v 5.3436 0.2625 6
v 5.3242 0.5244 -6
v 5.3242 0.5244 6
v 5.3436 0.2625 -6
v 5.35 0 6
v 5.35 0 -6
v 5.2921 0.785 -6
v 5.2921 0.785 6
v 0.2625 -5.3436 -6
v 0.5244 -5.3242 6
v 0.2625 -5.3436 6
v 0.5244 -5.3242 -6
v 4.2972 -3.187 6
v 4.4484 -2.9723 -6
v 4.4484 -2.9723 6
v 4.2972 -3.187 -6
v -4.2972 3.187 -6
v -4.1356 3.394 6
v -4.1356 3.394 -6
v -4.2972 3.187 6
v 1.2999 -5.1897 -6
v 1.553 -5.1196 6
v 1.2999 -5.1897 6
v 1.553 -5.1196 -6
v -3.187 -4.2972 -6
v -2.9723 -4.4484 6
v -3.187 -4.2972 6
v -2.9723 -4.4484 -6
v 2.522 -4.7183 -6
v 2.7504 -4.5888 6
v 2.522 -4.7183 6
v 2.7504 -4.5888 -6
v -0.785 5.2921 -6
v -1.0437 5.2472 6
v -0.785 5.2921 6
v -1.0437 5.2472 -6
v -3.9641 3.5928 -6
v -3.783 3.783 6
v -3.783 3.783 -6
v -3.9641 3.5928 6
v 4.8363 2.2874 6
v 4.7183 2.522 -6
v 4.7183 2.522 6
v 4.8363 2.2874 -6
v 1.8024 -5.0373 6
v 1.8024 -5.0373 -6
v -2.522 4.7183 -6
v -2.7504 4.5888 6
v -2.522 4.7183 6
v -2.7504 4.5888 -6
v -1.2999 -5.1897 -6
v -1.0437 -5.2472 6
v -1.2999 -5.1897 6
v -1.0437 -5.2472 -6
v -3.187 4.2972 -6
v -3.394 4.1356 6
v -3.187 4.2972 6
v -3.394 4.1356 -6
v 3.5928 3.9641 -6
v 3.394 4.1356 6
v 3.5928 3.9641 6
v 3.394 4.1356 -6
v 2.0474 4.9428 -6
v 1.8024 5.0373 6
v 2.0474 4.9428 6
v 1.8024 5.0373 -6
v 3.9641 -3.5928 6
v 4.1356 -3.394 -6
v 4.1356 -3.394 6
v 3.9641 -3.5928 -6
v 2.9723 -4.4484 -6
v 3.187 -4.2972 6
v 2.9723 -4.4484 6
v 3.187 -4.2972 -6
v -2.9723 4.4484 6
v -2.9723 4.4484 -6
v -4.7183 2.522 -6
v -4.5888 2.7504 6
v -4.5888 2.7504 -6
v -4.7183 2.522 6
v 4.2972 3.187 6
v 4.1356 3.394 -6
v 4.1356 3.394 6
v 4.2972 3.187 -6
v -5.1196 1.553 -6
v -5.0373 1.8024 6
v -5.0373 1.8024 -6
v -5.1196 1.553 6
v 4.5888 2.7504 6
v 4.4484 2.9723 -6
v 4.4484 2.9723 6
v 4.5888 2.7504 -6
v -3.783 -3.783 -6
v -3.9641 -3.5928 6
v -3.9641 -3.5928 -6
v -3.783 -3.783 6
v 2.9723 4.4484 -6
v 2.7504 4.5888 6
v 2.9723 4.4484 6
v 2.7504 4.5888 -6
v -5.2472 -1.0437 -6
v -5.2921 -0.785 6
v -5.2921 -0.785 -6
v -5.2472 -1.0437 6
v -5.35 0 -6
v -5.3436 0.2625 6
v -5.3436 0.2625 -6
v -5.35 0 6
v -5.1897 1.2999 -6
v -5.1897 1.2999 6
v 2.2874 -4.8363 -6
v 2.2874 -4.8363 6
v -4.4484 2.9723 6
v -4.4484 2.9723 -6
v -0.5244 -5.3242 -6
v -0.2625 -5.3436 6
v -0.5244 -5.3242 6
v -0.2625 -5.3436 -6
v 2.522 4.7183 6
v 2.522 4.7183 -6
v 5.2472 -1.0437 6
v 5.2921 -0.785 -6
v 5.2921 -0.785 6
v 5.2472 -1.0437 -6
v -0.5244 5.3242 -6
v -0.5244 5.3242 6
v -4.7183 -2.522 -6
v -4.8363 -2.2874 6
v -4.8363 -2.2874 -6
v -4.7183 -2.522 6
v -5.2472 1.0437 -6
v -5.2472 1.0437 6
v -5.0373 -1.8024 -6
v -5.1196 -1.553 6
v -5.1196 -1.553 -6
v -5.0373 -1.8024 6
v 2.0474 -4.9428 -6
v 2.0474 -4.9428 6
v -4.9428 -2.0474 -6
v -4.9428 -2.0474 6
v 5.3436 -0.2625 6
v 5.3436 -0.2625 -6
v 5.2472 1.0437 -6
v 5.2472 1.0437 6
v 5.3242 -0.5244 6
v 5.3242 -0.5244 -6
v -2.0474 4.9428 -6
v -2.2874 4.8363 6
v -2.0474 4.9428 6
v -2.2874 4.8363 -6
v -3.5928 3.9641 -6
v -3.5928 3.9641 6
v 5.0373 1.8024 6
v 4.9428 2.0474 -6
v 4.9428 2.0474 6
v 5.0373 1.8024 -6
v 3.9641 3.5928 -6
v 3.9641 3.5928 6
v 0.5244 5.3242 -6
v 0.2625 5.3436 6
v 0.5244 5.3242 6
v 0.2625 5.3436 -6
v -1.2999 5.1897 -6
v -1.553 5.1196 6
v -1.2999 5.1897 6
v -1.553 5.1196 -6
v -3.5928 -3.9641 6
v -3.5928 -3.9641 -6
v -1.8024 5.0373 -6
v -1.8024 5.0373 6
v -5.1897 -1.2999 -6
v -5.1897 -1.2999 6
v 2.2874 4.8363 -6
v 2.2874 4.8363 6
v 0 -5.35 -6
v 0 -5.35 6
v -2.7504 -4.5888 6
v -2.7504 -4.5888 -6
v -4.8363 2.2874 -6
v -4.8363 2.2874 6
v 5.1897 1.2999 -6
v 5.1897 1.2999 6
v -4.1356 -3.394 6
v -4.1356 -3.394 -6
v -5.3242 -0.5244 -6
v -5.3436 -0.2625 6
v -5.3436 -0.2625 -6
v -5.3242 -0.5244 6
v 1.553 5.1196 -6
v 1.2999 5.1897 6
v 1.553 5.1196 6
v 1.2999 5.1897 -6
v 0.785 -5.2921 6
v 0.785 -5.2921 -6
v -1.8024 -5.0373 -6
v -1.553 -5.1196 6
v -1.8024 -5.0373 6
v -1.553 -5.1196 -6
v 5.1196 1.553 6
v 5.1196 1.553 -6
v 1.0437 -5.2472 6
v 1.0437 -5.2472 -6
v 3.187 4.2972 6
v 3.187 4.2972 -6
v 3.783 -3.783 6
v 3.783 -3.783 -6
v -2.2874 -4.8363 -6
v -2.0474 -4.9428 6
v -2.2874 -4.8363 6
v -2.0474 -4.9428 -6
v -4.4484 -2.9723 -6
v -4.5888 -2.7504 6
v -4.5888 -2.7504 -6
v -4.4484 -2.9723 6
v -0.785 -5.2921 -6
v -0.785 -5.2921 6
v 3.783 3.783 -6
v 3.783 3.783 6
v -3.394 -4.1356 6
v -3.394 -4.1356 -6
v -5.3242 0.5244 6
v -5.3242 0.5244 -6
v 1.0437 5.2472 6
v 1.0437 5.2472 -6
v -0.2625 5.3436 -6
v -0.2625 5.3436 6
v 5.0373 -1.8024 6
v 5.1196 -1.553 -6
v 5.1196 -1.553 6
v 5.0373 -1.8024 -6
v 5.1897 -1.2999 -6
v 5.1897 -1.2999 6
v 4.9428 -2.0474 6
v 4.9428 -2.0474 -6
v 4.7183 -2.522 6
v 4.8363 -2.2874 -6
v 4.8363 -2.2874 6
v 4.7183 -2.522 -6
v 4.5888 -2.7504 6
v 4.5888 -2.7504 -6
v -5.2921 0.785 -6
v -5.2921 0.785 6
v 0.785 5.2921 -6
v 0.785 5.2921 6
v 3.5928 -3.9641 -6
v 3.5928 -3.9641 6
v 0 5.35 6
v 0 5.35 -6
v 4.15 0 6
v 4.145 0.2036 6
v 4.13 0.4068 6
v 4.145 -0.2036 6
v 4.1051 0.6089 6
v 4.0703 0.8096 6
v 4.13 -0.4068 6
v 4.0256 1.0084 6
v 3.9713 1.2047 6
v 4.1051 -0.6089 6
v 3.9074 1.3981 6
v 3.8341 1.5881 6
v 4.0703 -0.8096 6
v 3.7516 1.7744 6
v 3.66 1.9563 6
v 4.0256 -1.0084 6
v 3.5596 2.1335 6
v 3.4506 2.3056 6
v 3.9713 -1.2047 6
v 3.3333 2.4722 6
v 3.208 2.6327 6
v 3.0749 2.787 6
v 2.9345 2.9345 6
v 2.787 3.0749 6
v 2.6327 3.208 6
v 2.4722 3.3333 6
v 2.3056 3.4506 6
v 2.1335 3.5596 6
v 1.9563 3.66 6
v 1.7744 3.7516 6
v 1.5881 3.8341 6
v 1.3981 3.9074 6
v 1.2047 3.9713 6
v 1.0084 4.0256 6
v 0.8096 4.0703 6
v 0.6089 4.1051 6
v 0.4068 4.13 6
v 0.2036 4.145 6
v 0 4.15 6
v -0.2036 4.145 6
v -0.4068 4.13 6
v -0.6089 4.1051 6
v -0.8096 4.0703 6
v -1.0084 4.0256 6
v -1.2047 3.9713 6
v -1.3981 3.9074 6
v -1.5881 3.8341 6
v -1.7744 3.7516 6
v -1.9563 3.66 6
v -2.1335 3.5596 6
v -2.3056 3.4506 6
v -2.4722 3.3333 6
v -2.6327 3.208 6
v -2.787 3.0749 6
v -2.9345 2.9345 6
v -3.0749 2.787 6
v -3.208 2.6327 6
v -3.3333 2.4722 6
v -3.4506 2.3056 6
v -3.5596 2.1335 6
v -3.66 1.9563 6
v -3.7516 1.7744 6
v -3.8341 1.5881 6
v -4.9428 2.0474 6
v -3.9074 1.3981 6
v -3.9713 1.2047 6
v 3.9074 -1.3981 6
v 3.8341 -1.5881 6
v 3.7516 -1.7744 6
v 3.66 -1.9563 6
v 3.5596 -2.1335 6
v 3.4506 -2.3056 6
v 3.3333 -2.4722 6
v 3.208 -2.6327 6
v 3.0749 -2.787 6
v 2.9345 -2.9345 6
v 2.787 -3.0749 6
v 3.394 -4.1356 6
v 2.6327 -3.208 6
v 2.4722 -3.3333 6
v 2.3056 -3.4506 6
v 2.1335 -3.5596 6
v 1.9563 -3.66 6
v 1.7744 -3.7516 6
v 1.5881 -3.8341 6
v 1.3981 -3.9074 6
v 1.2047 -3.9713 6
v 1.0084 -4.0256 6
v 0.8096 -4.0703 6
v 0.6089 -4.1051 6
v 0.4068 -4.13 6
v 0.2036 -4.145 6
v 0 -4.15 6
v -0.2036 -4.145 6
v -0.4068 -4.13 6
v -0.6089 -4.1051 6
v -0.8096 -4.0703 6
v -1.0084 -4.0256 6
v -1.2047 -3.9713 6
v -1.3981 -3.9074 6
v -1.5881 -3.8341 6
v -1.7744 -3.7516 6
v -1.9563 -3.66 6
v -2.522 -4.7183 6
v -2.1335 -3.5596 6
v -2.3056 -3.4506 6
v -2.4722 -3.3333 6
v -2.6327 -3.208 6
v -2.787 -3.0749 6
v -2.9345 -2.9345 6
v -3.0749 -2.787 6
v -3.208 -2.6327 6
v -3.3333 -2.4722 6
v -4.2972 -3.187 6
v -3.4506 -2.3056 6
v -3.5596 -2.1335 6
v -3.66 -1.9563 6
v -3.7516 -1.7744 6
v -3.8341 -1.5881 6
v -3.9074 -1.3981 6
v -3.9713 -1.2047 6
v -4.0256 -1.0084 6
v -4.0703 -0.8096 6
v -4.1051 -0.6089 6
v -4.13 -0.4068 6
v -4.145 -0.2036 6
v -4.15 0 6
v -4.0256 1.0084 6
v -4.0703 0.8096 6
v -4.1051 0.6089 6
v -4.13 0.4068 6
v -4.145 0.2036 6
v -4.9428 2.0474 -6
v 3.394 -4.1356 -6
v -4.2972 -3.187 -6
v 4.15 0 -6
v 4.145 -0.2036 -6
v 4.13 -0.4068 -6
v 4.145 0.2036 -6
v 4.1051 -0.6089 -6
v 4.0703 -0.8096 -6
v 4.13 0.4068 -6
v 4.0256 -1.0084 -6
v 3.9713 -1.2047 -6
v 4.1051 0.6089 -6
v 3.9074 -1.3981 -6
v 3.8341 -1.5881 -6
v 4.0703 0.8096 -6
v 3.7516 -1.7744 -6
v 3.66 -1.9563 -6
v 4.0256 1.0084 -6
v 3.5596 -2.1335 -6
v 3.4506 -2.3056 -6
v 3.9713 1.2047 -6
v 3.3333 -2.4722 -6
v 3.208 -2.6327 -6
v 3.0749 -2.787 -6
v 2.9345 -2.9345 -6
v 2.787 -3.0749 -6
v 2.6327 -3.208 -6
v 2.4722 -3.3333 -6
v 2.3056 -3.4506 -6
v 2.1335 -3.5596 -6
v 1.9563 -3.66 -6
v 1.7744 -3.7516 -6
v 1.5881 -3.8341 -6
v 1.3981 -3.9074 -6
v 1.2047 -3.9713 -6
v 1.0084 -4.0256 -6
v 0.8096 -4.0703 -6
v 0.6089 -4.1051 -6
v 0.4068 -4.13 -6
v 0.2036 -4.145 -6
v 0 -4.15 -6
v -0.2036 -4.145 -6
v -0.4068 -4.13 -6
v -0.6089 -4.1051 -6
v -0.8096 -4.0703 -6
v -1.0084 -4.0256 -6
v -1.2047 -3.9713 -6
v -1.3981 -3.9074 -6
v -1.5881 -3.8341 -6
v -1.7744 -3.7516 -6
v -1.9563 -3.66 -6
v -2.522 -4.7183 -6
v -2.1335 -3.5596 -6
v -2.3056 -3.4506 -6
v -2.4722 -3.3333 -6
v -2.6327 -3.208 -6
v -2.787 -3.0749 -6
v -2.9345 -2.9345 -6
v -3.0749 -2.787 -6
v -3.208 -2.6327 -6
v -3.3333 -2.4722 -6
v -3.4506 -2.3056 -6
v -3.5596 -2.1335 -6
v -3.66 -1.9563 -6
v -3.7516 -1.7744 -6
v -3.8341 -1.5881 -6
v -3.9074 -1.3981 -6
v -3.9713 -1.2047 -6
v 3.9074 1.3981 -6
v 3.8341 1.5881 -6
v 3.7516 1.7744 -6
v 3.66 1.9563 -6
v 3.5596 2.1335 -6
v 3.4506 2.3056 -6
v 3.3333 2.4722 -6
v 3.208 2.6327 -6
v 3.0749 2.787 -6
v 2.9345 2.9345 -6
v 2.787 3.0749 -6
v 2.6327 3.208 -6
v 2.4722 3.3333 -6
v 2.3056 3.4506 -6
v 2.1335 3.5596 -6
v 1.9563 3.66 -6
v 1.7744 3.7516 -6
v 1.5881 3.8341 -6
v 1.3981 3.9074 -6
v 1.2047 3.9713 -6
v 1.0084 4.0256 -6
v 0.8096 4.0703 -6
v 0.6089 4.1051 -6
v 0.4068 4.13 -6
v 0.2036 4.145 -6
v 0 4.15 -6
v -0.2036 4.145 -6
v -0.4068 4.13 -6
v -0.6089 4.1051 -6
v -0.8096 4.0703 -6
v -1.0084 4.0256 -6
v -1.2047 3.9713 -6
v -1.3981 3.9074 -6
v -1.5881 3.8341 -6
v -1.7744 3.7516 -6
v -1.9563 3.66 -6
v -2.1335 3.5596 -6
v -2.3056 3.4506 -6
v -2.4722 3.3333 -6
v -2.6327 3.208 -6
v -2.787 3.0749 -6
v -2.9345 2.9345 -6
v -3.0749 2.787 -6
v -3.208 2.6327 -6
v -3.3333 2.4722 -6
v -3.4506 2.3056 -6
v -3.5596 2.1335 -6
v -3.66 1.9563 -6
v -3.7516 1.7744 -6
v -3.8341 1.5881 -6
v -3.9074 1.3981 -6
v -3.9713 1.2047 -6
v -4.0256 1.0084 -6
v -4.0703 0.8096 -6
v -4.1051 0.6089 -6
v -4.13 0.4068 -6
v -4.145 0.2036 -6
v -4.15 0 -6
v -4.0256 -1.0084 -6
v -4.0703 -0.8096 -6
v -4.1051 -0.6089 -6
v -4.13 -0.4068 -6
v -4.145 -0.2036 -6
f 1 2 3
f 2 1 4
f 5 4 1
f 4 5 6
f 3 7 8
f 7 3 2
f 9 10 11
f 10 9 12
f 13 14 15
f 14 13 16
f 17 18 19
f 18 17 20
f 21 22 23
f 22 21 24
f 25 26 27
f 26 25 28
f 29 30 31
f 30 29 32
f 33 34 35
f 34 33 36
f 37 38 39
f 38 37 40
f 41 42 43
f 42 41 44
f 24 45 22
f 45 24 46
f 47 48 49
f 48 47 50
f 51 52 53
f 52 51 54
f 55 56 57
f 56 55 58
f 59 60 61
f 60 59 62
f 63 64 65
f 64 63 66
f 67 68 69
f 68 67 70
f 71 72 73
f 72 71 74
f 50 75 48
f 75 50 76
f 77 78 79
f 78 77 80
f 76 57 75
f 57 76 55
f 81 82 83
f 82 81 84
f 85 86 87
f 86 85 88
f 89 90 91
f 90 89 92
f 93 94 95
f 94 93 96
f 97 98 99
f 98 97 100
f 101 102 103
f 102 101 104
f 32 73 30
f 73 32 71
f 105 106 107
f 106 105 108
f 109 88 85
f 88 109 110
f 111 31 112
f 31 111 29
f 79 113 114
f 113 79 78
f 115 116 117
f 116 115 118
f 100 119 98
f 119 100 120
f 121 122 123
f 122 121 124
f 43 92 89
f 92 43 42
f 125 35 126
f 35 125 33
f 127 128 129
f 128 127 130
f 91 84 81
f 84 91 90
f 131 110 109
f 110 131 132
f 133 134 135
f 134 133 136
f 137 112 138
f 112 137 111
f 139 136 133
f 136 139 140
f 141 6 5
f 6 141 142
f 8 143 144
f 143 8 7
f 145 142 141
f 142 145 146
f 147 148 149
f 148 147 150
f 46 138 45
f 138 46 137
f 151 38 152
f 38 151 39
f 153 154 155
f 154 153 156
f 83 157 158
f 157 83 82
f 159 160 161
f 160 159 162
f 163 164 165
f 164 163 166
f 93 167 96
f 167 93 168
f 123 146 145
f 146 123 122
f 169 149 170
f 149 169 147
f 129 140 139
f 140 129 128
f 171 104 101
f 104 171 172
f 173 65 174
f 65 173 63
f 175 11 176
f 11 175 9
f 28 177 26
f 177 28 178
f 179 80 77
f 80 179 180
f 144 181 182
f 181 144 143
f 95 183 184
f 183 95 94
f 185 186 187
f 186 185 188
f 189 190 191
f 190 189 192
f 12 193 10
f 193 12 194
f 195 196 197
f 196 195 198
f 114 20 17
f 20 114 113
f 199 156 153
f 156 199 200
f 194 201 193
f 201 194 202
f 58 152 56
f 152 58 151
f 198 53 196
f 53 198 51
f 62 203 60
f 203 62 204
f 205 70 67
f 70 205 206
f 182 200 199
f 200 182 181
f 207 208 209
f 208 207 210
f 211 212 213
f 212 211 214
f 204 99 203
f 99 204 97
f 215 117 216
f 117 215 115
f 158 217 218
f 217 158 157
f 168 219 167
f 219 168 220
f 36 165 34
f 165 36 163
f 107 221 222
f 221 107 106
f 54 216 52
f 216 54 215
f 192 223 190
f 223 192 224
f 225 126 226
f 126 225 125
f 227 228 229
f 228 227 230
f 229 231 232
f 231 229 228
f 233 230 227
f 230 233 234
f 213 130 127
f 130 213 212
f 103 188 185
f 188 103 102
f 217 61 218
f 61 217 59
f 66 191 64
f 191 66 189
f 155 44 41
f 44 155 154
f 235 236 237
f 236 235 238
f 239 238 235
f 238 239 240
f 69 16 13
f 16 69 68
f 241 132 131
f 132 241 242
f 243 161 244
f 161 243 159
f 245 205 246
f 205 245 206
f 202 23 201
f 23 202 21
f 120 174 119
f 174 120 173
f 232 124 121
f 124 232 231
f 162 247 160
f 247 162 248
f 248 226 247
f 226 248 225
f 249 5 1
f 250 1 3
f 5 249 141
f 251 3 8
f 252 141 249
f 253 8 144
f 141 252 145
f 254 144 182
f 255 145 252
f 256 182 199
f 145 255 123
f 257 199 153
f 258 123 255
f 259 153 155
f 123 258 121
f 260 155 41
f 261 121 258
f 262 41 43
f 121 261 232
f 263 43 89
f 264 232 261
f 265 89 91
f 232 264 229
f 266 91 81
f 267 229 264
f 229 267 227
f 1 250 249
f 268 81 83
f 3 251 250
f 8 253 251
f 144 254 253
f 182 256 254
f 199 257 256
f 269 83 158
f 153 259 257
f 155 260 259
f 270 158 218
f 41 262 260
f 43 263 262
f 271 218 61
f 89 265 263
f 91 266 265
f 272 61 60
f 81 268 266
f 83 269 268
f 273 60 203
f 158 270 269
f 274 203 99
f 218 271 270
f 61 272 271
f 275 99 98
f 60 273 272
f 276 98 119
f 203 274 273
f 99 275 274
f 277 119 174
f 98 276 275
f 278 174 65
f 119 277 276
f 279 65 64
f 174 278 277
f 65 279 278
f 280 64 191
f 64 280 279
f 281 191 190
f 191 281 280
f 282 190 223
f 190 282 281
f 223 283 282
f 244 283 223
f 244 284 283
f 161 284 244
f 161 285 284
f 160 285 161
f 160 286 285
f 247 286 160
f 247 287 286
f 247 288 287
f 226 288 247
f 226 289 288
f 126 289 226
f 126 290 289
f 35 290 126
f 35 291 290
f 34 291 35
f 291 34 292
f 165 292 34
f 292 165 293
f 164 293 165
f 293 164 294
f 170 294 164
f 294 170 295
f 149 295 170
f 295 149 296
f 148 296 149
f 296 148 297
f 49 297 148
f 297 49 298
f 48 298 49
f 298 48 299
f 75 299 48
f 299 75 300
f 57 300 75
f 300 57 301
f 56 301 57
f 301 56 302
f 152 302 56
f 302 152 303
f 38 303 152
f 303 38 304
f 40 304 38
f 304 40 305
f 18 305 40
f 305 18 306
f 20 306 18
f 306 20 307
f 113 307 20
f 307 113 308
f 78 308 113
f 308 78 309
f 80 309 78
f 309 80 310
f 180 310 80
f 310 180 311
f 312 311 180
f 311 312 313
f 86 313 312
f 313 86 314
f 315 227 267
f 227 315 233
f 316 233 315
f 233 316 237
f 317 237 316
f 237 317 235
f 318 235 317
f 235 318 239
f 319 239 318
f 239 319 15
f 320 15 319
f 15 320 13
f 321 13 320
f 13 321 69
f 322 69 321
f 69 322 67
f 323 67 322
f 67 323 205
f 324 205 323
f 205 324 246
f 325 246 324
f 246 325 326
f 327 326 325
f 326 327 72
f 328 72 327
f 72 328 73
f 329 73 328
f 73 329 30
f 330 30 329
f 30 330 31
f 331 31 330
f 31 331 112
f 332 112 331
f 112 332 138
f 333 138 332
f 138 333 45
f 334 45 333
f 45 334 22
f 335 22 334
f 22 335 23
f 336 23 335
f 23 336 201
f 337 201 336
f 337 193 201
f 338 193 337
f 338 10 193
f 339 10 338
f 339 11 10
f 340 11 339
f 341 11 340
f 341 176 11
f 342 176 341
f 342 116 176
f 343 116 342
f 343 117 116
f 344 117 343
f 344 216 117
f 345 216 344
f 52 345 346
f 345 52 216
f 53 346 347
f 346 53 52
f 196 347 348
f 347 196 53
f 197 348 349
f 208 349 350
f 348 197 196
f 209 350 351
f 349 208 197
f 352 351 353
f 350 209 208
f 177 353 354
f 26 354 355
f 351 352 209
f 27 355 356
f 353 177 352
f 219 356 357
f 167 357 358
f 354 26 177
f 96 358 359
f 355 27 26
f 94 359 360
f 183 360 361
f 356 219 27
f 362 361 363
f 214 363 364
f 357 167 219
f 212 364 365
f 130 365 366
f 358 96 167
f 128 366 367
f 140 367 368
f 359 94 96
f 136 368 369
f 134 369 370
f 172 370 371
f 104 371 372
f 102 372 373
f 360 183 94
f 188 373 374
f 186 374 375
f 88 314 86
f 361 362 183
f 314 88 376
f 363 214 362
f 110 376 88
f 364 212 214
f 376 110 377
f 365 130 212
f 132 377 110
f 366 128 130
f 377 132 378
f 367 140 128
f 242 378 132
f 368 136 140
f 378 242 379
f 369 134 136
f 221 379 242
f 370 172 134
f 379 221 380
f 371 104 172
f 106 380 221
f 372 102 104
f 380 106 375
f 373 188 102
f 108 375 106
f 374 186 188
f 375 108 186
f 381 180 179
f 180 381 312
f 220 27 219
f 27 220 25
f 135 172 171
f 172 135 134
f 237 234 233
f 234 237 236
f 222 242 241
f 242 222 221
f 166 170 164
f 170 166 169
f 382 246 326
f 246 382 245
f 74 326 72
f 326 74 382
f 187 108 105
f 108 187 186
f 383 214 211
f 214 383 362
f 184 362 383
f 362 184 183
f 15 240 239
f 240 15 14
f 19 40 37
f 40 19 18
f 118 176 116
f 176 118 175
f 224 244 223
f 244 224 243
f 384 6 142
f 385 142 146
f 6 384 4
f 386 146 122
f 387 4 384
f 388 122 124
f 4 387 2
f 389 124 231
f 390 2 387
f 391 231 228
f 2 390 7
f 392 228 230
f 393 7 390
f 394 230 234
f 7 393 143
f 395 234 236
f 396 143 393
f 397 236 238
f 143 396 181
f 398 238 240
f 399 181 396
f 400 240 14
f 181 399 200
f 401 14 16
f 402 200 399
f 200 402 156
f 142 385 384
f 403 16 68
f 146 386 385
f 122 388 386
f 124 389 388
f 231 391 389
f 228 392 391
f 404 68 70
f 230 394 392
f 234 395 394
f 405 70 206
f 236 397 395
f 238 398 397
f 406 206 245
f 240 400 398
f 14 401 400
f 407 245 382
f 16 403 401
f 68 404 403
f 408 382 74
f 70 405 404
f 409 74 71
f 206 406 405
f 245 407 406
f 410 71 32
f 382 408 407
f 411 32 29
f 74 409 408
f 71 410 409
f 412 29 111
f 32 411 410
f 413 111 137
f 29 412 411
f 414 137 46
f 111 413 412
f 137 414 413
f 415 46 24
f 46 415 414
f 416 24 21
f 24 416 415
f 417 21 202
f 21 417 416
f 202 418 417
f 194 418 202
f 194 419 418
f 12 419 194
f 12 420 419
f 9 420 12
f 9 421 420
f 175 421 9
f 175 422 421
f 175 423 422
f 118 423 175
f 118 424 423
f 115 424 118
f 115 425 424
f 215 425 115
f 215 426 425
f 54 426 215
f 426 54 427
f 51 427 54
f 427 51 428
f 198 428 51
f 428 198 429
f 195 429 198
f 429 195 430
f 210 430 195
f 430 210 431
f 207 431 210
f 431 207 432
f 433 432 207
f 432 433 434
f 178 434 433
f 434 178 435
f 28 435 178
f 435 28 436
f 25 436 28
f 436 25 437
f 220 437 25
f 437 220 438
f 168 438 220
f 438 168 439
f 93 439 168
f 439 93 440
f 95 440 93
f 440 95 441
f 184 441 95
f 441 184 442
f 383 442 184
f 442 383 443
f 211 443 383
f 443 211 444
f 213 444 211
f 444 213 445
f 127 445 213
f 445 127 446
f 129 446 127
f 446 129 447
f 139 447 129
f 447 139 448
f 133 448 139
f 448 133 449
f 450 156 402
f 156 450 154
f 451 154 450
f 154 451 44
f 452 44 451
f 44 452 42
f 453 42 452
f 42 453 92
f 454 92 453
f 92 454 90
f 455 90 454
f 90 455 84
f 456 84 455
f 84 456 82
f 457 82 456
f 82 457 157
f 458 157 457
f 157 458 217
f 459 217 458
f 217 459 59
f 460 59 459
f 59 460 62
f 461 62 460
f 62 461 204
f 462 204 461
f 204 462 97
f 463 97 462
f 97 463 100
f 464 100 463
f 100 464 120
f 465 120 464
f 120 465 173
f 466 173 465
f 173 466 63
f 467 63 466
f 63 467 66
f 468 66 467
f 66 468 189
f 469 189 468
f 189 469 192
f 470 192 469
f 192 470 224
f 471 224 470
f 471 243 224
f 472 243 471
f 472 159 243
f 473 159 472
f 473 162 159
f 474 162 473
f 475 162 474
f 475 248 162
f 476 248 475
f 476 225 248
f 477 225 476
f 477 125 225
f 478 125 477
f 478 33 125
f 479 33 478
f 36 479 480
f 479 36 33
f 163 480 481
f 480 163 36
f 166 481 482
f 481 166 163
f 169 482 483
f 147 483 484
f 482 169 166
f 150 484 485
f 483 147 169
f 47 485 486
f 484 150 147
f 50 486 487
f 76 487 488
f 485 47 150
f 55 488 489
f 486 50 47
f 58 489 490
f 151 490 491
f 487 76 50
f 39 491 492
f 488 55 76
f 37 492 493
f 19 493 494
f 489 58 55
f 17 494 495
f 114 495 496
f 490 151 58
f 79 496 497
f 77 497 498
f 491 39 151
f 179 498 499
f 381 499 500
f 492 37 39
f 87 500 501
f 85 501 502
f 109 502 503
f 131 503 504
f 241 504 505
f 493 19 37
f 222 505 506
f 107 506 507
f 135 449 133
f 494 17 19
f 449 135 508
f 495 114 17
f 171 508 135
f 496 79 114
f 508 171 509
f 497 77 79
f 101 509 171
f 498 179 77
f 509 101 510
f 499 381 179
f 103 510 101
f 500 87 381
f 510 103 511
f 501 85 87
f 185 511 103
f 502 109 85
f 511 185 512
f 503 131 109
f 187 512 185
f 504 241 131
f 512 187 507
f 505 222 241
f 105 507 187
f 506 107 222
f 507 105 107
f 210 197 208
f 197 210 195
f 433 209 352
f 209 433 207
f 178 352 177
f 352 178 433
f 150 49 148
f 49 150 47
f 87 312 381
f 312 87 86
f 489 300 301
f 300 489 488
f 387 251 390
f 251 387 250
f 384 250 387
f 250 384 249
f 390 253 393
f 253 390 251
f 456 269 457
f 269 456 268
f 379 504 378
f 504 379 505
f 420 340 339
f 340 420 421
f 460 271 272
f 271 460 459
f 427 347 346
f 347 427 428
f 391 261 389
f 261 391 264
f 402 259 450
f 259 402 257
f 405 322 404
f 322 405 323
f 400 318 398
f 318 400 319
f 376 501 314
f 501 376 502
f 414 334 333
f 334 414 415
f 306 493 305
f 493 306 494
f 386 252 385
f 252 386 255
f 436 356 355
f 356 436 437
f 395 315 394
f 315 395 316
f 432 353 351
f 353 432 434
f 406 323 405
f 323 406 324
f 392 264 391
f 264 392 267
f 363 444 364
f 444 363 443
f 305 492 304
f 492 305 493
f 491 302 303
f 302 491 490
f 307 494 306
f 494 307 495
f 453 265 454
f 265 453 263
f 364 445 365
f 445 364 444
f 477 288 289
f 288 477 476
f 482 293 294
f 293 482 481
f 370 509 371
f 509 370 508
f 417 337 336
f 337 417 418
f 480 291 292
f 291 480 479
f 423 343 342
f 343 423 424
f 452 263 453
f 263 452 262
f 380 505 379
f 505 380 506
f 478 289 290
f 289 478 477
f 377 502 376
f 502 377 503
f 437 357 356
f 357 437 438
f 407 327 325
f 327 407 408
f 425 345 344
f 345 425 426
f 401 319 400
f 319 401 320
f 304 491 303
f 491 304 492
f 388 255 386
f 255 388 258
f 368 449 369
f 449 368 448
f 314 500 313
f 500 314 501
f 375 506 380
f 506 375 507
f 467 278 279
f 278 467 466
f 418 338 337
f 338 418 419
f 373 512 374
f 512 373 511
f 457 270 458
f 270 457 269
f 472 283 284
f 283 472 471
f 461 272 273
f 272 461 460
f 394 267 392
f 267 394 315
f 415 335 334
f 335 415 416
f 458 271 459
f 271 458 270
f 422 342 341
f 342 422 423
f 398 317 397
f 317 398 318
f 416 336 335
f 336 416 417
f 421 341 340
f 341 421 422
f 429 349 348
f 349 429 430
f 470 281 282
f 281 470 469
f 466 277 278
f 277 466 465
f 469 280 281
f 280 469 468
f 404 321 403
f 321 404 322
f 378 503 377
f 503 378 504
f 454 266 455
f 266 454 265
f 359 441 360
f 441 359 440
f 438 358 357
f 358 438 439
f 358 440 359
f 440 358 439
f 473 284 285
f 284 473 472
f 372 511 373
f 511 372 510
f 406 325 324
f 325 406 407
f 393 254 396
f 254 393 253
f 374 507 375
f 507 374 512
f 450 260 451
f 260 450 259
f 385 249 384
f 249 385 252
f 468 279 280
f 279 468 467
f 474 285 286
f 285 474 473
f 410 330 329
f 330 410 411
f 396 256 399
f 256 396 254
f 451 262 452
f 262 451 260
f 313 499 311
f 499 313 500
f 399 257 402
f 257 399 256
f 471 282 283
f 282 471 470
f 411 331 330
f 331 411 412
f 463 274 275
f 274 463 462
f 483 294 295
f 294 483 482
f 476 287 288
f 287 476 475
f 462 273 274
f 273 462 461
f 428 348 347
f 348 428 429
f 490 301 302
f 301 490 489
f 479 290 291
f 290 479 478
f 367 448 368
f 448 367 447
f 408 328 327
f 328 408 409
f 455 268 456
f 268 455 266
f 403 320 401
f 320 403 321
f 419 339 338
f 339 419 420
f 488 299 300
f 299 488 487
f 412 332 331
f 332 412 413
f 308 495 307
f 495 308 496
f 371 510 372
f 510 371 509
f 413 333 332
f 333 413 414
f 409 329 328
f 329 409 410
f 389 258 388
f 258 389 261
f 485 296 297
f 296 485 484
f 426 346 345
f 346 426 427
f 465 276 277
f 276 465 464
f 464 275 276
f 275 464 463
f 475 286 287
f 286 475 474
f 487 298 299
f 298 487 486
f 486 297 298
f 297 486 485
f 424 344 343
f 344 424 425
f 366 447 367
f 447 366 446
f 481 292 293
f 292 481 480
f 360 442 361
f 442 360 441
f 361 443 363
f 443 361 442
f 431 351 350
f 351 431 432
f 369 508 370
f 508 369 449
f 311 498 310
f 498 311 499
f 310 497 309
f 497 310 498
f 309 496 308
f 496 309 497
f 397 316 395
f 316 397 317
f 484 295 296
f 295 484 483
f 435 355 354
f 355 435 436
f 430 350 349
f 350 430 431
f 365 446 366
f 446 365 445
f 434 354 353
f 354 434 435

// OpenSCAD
// file: c_clip.scad
// C字クリップ（parts-library.md §4.5、ADR-0012・0013）。2026-11-08 に「横張り出し」の形に変えた。
// レールの座標（rail.scad と同じ：X＝横、Y＝レールの長さ＝手首→指先、Z＝外向き、原点＝レールの上面の中心）で作る。
//   レールの外向き Z は、手の甲の法線と親指側の横向きのちょうど間（45度）にあるので、レールの座標では
//     手の甲向き up ＝ [ s·side, 0, s ]、親指側 lat ＝ [ −s·side, 0, s ]、指先向き fwd ＝ [0, 1, 0]
//     （s ＝ 1/√2。side：右手 +1、左手 −1。左右で X の符号だけが入れ替わる＝鏡像）
//   輪の中心 ＝ 原点 + lat·CLIP_LAT_MM − up·CLIP_DOWN_MM + fwd·CLIP_FWD_MM（こぶしの親指側の横）
//   道具の軸 ＝ fwd·cos(tilt) − up·sin(tilt)。tilt は机（手の甲を上にして置いた姿勢）に対する傾き（60／70／80度）。
//     手の甲の上から下へ向けるとこぶしの指の背に当たり、机にも届かないので、輪をこぶしの横へ出して立てる（11/8 の計算）
//   開きは lat の向き（外側から押し込む）。板と輪は腕（hull）でつなぐ。
// 刷るときは、舌（アリ溝の凸）の底を机に置く向き（アリ溝の面がきれいに出る）。
// common.scad と rail.scad は入口のファイルが先に include する。hand（"right"／"left"）も入口のファイルが決める。

CLIP_PLATE_MM = 2.5;       // 舌の上の板の厚み（レールの上面に乗る）。2.0 から厚くした（腕の根元を受けるため。2026-11-08）
CLIP_ARM_W = 6.0;          // 輪と板をつなぐ腕の、輪の側の幅
CLIP_ROOT_X = 8.0;         // 腕の根元の台（板の上）：横（レールの X）
CLIP_ROOT_Y = 12.0;        // 同：長さ（レールの Y）
CLIP_ROOT_H = 5.0;         // 同：高さ。ペンを押す力は腕の根元に集まるので、根元を太く・先を細くする
CLIP_LAT_MM = 20.0;        // 輪の中心を、レールの上面の中心から親指側へ出す量
CLIP_DOWN_MM = 6.0;        // 同じく、手のひら側へ下げる量
CLIP_FWD_MM = 5.0;         // 同じく、指先側へ進める量
CLIP_S2 = 0.70710678;

function clip_side() = (hand == "left") ? -1 : 1;
function clip_up() = [CLIP_S2 * clip_side(), 0, CLIP_S2];
function clip_lat() = [-CLIP_S2 * clip_side(), 0, CLIP_S2];
function clip_fwd() = [0, 1, 0];
function clip_inner_d(tool_d, tpu) = tpu ? (tool_d - 0.2) + 2 * TPU_SLEEVE_WALL_MM : tool_d - CLIP_INTERFERENCE_MM;
function clip_tongue_len() = RAIL_LENGTH_MM - RAIL_END_WALL_MM - 1;
function clip_tongue_y0() = -RAIL_LENGTH_MM / 2 + 0.5;               // 手首側の端
function clip_axis(tilt) = clip_fwd() * cos(tilt) - clip_up() * sin(tilt);
function clip_open_dir(tilt) = clip_lat();                            // lat は fwd・up に垂直なので軸にも垂直
function clip_r_out(tool_d, wall, tpu) = clip_inner_d(tool_d, tpu) / 2 + wall;
// 輪の中心（レールの座標）。道具の太さによらず同じ所
function clip_center(tool_d, wall, height, tilt, tpu) =
  clip_lat() * CLIP_LAT_MM - clip_up() * CLIP_DOWN_MM + clip_fwd() * CLIP_FWD_MM;

// 輪の局所座標（Z＝軸、X＝開きの向き）からレールの座標へ
function clip_ring_matrix(c, tilt) =
  let(a = clip_axis(tilt), o = clip_open_dir(tilt), y = cross(a, o))
  [[o[0], y[0], a[0], c[0]], [o[1], y[1], a[1], c[1]], [o[2], y[2], a[2], c[2]], [0, 0, 0, 1]];

// 刷る向きで、いちばん低い所（舌の底か、輪の下端）の z。これを 0 に持ち上げる
function clip_print_zmin(tool_d, wall, height, tilt, tpu) =
  let(c = clip_center(tool_d, wall, height, tilt, tpu), a = clip_axis(tilt), ro = clip_r_out(tool_d, wall, tpu),
      ring_lo = c[2] - (ro * sqrt(max(0, 1 - a[2] * a[2])) + (height / 2) * abs(a[2])),
      tongue_lo = -RAIL_DEPTH_MM + DOVETAIL_CLEARANCE_MM - RAIL_DETENT_MM)
  min(ring_lo, tongue_lo);

// 舌（アリ溝の凸）と板
module clip_tongue(quality) {
  clr = DOVETAIL_CLEARANCE_MM;
  len = clip_tongue_len();
  y0 = clip_tongue_y0();
  wt = RAIL_WIDTH_MM - 2 * clr;
  wb = rail_bottom_w(clr);
  zb = -RAIL_DEPTH_MM + clr;
  // 舌：底が広く口が狭い台形。口から上は板まで同じ幅
  translate([0, y0 + len, 0]) rotate([90, 0, 0]) linear_extrude(height = len)
    polygon([[-wb / 2, zb], [wb / 2, zb], [wt / 2, 0], [wt / 2, clr + 0.01], [-wt / 2, clr + 0.01], [-wt / 2, 0]]);
  // 板（レールの上面に乗る。角を丸める）
  ow = rail_outer_w() - 1;
  translate([0, y0 + len / 2, clr + CLIP_PLATE_MM / 2])
    linear_extrude(height = CLIP_PLATE_MM, center = true) rounded_rect([ow, len], 1.2, $fn = 16);
  // 止めの出っ張り（舌の底、差し込む先から RAIL_DETENT_FROM_END_MM）
  translate([0, y0 + len + 0.5 - RAIL_DETENT_FROM_END_MM, zb - RAIL_DETENT_MM + 1.2])
    intersection() {
      sphere(r = 1.2, $fn = 24);
      // 球の下の部分（舌の底から RAIL_DETENT_MM 出る所と、舌に埋まる所）だけ残す
      translate([-1.5, -1.5, -1.2]) cube([3, 3, 1.2 + 0.3], center = false);
    }
}

// 輪（C の形）。局所座標：Z＝軸、+X＝開き
module clip_ring_2d(tool_d, wall, opening_ratio, tpu) {
  ri = clip_inner_d(tool_d, tpu) / 2;
  ro = ri + wall;
  w = opening_ratio * tool_d;
  ch = tan(CLIP_ENTRY_CHAMFER_DEG);
  offset(r = 0.5) offset(delta = -0.5)   // 腕の先を丸める
  difference() {
    circle(r = ro);
    // 穴は 0.3 小さく描き、内径そのものは c_clip_rail の 3D の円柱（r = ri）で決める。同じ半径を2回描くと
    // 面がほぼ重なって、溝と口の近くで閉じない立体になる太さがあった（5.25・6.5・12mm。2026-11-08）
    circle(r = ri - 0.3);
    // 開き：内側で幅 w、外へ向かって面取りの角度で広がる
    polygon([[0, -w / 2], [ri + 0.2, -w / 2], [ro + 1, -w / 2 - (wall + 0.8) * ch],
             [ro + 1, w / 2 + (wall + 0.8) * ch], [ri + 0.2, w / 2], [0, w / 2]]);
    // 根元の切り欠き（CLIP_ROOT_NOTCH_MM）は 2026-11-08 にやめた：差し込むときの応力が切り欠きに集まり
    // （見積もりで 27→37MPa）、PLA の積層の境目から割れやすくなるため
  }
}

module c_clip_rail(tool_d, wall, opening_ratio, height, tilt, grip_ribs, tpu, quality = "preview") {
  $fn = fn_for(quality);
  ri = clip_inner_d(tool_d, tpu) / 2;
  ro = ri + wall;
  c = clip_center(tool_d, wall, height, tilt, tpu);
  M = clip_ring_matrix(c, tilt);
  plate_top = DOVETAIL_CLEARANCE_MM + CLIP_PLATE_MM;
  ow = rail_outer_w() - 1;
  difference() {
    union() {
      clip_tongue(quality);
      // 輪の外形（穴はあとで抜く）
      multmatrix(M) linear_extrude(height = height, center = true) clip_ring_2d(tool_d, wall, opening_ratio, tpu);
      // 腕：板の上の太い根元の台（親指側の縁から内側へ CLIP_ROOT_X、前寄り）と、輪の手の側（開きの反対側）を hull でつなぐ。
      // 根元が太く先が細い片持ち梁になる（厚みゼロの縁で板に付けていた最初の形は、根元で折れやすかった）
      // 輪の側の箱は側面をわずかに傾ける（下 W−0.4、上 W+0.4）。側面が輪の軸と平行だと、輪の多角形の縦の辺と
      // ぴったり重なる太さがあり（例：12mm で 7.85×sin22.5°＝3.00）、閉じない立体になった（2026-11-08）
      hull() {
        translate([-clip_side() * (ow / 2 - CLIP_ROOT_X / 2), clip_tongue_y0() + clip_tongue_len() / 2 + 2.5, plate_top + CLIP_ROOT_H / 2 - 0.01])
          cube([CLIP_ROOT_X, CLIP_ROOT_Y, CLIP_ROOT_H], center = true);
        multmatrix(M) translate([-ro + 0.6, 0, 0]) hull() {
          translate([0, 0, -height * 0.4]) cube([1.2, CLIP_ARM_W - 0.4, 0.01], center = true);
          translate([0, 0, height * 0.4]) cube([1.2, CLIP_ARM_W + 0.4, 0.01], center = true);
        }
      }
    }
    // 道具の通る穴（輪の高さの分だけ。腕を貫かない）
    multmatrix(M) cylinder(r = ri, h = height + 2, center = true);
    // 開きは clip_ring_2d で切ってある（内側は幅 w、ri+0.2 から外へ面取り）。ここで台形をもう一度引いてはいけない：
    // 中心から広がる台形だと内側の口が w より広くなり（8.5mm で 7.5mm、12mm で 11.1mm に実測）道具を保持できず、
    // 2D の切り口と面がほぼ重なって閉じない立体になる太さがあった（2026-11-08）
    // 内側の細い溝（道具が軸の向きに滑らないよう、輪をぐるりと回る溝）
    if (grip_ribs && !tpu) {
      n = floor((height - 3) / CLIP_GROOVE_PITCH);
      for (i = [0 : max(0, n - 1)]) {
        z = -((n - 1) * CLIP_GROOVE_PITCH) / 2 + i * CLIP_GROOVE_PITCH;
        multmatrix(M) translate([0, 0, z])
          cylinder(r = ri + CLIP_GROOVE_D, h = CLIP_GROOVE_W, center = true);
      }
    }
  }
}

// 刷る向き：舌の底を机に置く（レールの座標のまま、いちばん低い所を z=0 へ）。z<0 は切る
module c_clip_print(tool_d, wall, opening_ratio, height, tilt, grip_ribs, tpu, quality = "print") {
  intersection() {
    translate([0, 0, -clip_print_zmin(tool_d, wall, height, tilt, tpu)])
      c_clip_rail(tool_d, wall, opening_ratio, height, tilt, grip_ribs, tpu, quality);
    translate([-200, -200, 0]) cube([400, 400, 400]);
  }
}

// TPUの筒（局所：軸が Z）
module tpu_sleeve_local(tool_d, height, quality = "preview") {
  $fn = fn_for(quality);
  ri = (tool_d - 0.2) / 2;
  ro = ri + TPU_SLEEVE_WALL_MM;
  difference() {
    cylinder(r = ro, h = height, center = true);
    cylinder(r = ri, h = height + 2, center = true);
  }
}

module tpu_sleeve_rail(tool_d, wall, height, tilt, quality = "preview") {
  c = clip_center(tool_d, wall, height, tilt, true);
  multmatrix(clip_ring_matrix(c, tilt)) tpu_sleeve_local(tool_d, height, quality);
}
// file: rail.scad
// アリ溝のレール（カバー側。parts-library.md §4.4）。寸法は固定。
// レールの座標：原点＝レールの上面（溝の口）の中心。X＝横、Y＝長さ（指先の向き。+Y の端が閉じていて止まり）、Z＝外向き。
// クリップは −Y の端（手首側）から差し込み、+Y の端まで滑らせると「カチッ」と止まる。
// common.scad は入口のファイル（main.scad など）が先に include する

RAIL_END_WALL_MM = 2.5;   // 閉じた端の壁

module rail_block(quality = "preview") {
  $fn = fn_for(quality) / 4;
  ow = rail_outer_w();
  h = rail_height() + RAIL_FOOT_MM;
  r = MIN_EDGE_RADIUS_MM;
  L = RAIL_LENGTH_MM;
  difference() {
    // 外形（角を丸めた箱）。下は殻の中へ RAIL_FOOT_MM 入り込む
    minkowski() {
      translate([-(ow / 2 - r), -(L / 2 - r), -h + r]) cube([ow - 2 * r, L - 2 * r, h - 2 * r]);
      sphere(r = r);
    }
    // 溝（−Y の端は開き、+Y の端は閉じる）
    // rotate([90,0,0]) で 2D の y が Z に、押し出しが −Y の向きになる
    glen = L + 1 - RAIL_END_WALL_MM;
    translate([0, -L / 2 - 1 + glen, 0]) rotate([90, 0, 0])
      linear_extrude(height = glen) dovetail_profile_xy();
    // 止めのくぼみ（溝の底。閉じた端から RAIL_DETENT_FROM_END_MM）
    translate([0, L / 2 - RAIL_END_WALL_MM - RAIL_DETENT_FROM_END_MM, -RAIL_DEPTH_MM])
      sphere(r = 1.4, $fn = 24);
    // 口の縁の面取り（差し込みやすく）
    translate([0, -L / 2, 0]) rotate([45, 0, 0]) cube([RAIL_WIDTH_MM + 2, 1.2, 1.2], center = true);
  }
}

// dovetail_profile を XY 平面（Y を元の Z に）へ置いたもの（linear_extrude 用）
module dovetail_profile_xy(clr = 0) {
  wt = RAIL_WIDTH_MM - 2 * clr;
  wb = rail_bottom_w(clr);
  zb = -RAIL_DEPTH_MM + clr;
  polygon([[-wb / 2, zb], [wb / 2, zb], [wt / 2, 0], [wt / 2, 2], [-wt / 2, 2], [-wt / 2, 0]]);
}

// カバーに付ける：origin（レールの上面の中心）と frame（行：X・Y・Z の向き）で置く
module rail_on_cover(origin, frame, quality = "preview") {
  multmatrix(frame_matrix(origin, frame)) rail_block(quality);
}
// file: ../lib/common.scad
// 固定値（parts-library.md §3）。AI は変えられない。値は 11/9 の朝の試し刷りで決め直す（仮の値に「仮」）。
// 生成API（api/app/geometry/consts.py）も同じ値を catalog.json から読む。変えるときは catalog.json と一緒に。

NOZZLE_MM = 0.4;
MIN_WALL_MM = 2.0;
MIN_EDGE_RADIUS_MM = 1.5;
MAX_OVERHANG_DEG = 45;
HAND_CLEARANCE_MM = 1.5;        // 仮。フェルトの厚みを含む
FELT_THICKNESS_MM = 1.0;        // 要確認
DOVETAIL_CLEARANCE_MM = 0.25;   // 仮。アリ溝のすき間（片側）
CLIP_INTERFERENCE_MM = 0.3;     // 仮。クリップのしめしろ
CLIP_ENTRY_CHAMFER_DEG = 30;
CLIP_ROOT_NOTCH_MM = 0.6;
CLIP_GROOVE_W = 1.0;            // 内側の溝の幅
CLIP_GROOVE_D = 0.4;            // 内側の溝の深さ
CLIP_GROOVE_PITCH = 3.0;        // 内側の溝の間隔
TPU_SLEEVE_WALL_MM = 1.2;       // 仮
WRIST_FREE_MM = 25;
THUMB_EXTRA_MM = 2.0;
BED_MM = [180, 180, 180];
FN_PREVIEW = 48;
FN_PRINT = 128;

// アリ溝のレール（固定。parts-library.md §4.4）
RAIL_WIDTH_MM = 10;     // 溝の口の幅
RAIL_DEPTH_MM = 4;      // 溝の深さ
RAIL_LENGTH_MM = 24;
RAIL_DOVETAIL_DEG = 60; // 溝の壁と底のなす角
RAIL_DETENT_MM = 0.6;   // 止めの出っ張りの高さ
RAIL_WALL_MM = 2.5;     // 溝のまわりの肉
RAIL_BASE_MM = 2.0;     // 溝の底の下の肉
RAIL_FOOT_MM = 6.0;     // 殻の中へ入り込ませる土台（内側へ出た分は keepout で削る）
RAIL_DETENT_FROM_END_MM = 3.0;

// 溝の底の幅（口より広い）
function rail_bottom_w(clr = 0) = RAIL_WIDTH_MM + 2 * RAIL_DEPTH_MM / tan(RAIL_DOVETAIL_DEG) - 2 * clr;
function rail_outer_w() = rail_bottom_w() + 2 * RAIL_WALL_MM;
function rail_height() = RAIL_DEPTH_MM + RAIL_BASE_MM;

function fn_for(quality) = quality == "print" ? FN_PRINT : FN_PREVIEW;

// 角を丸めた長方形（2D、中心）
module rounded_rect(size, r) {
  r2 = min(r, min(size[0], size[1]) / 2 - 0.01);
  offset(r = r2) square([size[0] - 2 * r2, size[1] - 2 * r2], center = true);
}

// 4x4 行列（行のリスト）から multmatrix 用の形へ
function frame_matrix(origin, rows) = [
  [rows[0][0], rows[1][0], rows[2][0], origin[0]],
  [rows[0][1], rows[1][1], rows[2][1], origin[1]],
  [rows[0][2], rows[1][2], rows[2][2], origin[2]],
  [0, 0, 0, 1]
];

// 向き v（単位ベクトル）を Z に合わせる回転（v の向きに穴を開けるとき使う）
module orient_z_to(v) {
  vx = v[0]; vy = v[1]; vz = v[2];
  b = acos(max(-1, min(1, vz)));
  a = atan2(vy, vx);
  rotate([0, b, a]) children();
}
// main file
// TPUの筒（parts-library.md §4.6）。形は c_clip.scad の tpu_sleeve_local / tpu_sleeve_rail。
// このファイルは、筒だけを刷る試し用の入口（main.scad の mode="sleeve" と同じ形）。
include <../lib/common.scad>
include <rail.scad>
include <c_clip.scad>

tool_d_mm = 8.5;
height_mm = 12;
tpu_sleeve_local(tool_d_mm, height_mm, "print");
